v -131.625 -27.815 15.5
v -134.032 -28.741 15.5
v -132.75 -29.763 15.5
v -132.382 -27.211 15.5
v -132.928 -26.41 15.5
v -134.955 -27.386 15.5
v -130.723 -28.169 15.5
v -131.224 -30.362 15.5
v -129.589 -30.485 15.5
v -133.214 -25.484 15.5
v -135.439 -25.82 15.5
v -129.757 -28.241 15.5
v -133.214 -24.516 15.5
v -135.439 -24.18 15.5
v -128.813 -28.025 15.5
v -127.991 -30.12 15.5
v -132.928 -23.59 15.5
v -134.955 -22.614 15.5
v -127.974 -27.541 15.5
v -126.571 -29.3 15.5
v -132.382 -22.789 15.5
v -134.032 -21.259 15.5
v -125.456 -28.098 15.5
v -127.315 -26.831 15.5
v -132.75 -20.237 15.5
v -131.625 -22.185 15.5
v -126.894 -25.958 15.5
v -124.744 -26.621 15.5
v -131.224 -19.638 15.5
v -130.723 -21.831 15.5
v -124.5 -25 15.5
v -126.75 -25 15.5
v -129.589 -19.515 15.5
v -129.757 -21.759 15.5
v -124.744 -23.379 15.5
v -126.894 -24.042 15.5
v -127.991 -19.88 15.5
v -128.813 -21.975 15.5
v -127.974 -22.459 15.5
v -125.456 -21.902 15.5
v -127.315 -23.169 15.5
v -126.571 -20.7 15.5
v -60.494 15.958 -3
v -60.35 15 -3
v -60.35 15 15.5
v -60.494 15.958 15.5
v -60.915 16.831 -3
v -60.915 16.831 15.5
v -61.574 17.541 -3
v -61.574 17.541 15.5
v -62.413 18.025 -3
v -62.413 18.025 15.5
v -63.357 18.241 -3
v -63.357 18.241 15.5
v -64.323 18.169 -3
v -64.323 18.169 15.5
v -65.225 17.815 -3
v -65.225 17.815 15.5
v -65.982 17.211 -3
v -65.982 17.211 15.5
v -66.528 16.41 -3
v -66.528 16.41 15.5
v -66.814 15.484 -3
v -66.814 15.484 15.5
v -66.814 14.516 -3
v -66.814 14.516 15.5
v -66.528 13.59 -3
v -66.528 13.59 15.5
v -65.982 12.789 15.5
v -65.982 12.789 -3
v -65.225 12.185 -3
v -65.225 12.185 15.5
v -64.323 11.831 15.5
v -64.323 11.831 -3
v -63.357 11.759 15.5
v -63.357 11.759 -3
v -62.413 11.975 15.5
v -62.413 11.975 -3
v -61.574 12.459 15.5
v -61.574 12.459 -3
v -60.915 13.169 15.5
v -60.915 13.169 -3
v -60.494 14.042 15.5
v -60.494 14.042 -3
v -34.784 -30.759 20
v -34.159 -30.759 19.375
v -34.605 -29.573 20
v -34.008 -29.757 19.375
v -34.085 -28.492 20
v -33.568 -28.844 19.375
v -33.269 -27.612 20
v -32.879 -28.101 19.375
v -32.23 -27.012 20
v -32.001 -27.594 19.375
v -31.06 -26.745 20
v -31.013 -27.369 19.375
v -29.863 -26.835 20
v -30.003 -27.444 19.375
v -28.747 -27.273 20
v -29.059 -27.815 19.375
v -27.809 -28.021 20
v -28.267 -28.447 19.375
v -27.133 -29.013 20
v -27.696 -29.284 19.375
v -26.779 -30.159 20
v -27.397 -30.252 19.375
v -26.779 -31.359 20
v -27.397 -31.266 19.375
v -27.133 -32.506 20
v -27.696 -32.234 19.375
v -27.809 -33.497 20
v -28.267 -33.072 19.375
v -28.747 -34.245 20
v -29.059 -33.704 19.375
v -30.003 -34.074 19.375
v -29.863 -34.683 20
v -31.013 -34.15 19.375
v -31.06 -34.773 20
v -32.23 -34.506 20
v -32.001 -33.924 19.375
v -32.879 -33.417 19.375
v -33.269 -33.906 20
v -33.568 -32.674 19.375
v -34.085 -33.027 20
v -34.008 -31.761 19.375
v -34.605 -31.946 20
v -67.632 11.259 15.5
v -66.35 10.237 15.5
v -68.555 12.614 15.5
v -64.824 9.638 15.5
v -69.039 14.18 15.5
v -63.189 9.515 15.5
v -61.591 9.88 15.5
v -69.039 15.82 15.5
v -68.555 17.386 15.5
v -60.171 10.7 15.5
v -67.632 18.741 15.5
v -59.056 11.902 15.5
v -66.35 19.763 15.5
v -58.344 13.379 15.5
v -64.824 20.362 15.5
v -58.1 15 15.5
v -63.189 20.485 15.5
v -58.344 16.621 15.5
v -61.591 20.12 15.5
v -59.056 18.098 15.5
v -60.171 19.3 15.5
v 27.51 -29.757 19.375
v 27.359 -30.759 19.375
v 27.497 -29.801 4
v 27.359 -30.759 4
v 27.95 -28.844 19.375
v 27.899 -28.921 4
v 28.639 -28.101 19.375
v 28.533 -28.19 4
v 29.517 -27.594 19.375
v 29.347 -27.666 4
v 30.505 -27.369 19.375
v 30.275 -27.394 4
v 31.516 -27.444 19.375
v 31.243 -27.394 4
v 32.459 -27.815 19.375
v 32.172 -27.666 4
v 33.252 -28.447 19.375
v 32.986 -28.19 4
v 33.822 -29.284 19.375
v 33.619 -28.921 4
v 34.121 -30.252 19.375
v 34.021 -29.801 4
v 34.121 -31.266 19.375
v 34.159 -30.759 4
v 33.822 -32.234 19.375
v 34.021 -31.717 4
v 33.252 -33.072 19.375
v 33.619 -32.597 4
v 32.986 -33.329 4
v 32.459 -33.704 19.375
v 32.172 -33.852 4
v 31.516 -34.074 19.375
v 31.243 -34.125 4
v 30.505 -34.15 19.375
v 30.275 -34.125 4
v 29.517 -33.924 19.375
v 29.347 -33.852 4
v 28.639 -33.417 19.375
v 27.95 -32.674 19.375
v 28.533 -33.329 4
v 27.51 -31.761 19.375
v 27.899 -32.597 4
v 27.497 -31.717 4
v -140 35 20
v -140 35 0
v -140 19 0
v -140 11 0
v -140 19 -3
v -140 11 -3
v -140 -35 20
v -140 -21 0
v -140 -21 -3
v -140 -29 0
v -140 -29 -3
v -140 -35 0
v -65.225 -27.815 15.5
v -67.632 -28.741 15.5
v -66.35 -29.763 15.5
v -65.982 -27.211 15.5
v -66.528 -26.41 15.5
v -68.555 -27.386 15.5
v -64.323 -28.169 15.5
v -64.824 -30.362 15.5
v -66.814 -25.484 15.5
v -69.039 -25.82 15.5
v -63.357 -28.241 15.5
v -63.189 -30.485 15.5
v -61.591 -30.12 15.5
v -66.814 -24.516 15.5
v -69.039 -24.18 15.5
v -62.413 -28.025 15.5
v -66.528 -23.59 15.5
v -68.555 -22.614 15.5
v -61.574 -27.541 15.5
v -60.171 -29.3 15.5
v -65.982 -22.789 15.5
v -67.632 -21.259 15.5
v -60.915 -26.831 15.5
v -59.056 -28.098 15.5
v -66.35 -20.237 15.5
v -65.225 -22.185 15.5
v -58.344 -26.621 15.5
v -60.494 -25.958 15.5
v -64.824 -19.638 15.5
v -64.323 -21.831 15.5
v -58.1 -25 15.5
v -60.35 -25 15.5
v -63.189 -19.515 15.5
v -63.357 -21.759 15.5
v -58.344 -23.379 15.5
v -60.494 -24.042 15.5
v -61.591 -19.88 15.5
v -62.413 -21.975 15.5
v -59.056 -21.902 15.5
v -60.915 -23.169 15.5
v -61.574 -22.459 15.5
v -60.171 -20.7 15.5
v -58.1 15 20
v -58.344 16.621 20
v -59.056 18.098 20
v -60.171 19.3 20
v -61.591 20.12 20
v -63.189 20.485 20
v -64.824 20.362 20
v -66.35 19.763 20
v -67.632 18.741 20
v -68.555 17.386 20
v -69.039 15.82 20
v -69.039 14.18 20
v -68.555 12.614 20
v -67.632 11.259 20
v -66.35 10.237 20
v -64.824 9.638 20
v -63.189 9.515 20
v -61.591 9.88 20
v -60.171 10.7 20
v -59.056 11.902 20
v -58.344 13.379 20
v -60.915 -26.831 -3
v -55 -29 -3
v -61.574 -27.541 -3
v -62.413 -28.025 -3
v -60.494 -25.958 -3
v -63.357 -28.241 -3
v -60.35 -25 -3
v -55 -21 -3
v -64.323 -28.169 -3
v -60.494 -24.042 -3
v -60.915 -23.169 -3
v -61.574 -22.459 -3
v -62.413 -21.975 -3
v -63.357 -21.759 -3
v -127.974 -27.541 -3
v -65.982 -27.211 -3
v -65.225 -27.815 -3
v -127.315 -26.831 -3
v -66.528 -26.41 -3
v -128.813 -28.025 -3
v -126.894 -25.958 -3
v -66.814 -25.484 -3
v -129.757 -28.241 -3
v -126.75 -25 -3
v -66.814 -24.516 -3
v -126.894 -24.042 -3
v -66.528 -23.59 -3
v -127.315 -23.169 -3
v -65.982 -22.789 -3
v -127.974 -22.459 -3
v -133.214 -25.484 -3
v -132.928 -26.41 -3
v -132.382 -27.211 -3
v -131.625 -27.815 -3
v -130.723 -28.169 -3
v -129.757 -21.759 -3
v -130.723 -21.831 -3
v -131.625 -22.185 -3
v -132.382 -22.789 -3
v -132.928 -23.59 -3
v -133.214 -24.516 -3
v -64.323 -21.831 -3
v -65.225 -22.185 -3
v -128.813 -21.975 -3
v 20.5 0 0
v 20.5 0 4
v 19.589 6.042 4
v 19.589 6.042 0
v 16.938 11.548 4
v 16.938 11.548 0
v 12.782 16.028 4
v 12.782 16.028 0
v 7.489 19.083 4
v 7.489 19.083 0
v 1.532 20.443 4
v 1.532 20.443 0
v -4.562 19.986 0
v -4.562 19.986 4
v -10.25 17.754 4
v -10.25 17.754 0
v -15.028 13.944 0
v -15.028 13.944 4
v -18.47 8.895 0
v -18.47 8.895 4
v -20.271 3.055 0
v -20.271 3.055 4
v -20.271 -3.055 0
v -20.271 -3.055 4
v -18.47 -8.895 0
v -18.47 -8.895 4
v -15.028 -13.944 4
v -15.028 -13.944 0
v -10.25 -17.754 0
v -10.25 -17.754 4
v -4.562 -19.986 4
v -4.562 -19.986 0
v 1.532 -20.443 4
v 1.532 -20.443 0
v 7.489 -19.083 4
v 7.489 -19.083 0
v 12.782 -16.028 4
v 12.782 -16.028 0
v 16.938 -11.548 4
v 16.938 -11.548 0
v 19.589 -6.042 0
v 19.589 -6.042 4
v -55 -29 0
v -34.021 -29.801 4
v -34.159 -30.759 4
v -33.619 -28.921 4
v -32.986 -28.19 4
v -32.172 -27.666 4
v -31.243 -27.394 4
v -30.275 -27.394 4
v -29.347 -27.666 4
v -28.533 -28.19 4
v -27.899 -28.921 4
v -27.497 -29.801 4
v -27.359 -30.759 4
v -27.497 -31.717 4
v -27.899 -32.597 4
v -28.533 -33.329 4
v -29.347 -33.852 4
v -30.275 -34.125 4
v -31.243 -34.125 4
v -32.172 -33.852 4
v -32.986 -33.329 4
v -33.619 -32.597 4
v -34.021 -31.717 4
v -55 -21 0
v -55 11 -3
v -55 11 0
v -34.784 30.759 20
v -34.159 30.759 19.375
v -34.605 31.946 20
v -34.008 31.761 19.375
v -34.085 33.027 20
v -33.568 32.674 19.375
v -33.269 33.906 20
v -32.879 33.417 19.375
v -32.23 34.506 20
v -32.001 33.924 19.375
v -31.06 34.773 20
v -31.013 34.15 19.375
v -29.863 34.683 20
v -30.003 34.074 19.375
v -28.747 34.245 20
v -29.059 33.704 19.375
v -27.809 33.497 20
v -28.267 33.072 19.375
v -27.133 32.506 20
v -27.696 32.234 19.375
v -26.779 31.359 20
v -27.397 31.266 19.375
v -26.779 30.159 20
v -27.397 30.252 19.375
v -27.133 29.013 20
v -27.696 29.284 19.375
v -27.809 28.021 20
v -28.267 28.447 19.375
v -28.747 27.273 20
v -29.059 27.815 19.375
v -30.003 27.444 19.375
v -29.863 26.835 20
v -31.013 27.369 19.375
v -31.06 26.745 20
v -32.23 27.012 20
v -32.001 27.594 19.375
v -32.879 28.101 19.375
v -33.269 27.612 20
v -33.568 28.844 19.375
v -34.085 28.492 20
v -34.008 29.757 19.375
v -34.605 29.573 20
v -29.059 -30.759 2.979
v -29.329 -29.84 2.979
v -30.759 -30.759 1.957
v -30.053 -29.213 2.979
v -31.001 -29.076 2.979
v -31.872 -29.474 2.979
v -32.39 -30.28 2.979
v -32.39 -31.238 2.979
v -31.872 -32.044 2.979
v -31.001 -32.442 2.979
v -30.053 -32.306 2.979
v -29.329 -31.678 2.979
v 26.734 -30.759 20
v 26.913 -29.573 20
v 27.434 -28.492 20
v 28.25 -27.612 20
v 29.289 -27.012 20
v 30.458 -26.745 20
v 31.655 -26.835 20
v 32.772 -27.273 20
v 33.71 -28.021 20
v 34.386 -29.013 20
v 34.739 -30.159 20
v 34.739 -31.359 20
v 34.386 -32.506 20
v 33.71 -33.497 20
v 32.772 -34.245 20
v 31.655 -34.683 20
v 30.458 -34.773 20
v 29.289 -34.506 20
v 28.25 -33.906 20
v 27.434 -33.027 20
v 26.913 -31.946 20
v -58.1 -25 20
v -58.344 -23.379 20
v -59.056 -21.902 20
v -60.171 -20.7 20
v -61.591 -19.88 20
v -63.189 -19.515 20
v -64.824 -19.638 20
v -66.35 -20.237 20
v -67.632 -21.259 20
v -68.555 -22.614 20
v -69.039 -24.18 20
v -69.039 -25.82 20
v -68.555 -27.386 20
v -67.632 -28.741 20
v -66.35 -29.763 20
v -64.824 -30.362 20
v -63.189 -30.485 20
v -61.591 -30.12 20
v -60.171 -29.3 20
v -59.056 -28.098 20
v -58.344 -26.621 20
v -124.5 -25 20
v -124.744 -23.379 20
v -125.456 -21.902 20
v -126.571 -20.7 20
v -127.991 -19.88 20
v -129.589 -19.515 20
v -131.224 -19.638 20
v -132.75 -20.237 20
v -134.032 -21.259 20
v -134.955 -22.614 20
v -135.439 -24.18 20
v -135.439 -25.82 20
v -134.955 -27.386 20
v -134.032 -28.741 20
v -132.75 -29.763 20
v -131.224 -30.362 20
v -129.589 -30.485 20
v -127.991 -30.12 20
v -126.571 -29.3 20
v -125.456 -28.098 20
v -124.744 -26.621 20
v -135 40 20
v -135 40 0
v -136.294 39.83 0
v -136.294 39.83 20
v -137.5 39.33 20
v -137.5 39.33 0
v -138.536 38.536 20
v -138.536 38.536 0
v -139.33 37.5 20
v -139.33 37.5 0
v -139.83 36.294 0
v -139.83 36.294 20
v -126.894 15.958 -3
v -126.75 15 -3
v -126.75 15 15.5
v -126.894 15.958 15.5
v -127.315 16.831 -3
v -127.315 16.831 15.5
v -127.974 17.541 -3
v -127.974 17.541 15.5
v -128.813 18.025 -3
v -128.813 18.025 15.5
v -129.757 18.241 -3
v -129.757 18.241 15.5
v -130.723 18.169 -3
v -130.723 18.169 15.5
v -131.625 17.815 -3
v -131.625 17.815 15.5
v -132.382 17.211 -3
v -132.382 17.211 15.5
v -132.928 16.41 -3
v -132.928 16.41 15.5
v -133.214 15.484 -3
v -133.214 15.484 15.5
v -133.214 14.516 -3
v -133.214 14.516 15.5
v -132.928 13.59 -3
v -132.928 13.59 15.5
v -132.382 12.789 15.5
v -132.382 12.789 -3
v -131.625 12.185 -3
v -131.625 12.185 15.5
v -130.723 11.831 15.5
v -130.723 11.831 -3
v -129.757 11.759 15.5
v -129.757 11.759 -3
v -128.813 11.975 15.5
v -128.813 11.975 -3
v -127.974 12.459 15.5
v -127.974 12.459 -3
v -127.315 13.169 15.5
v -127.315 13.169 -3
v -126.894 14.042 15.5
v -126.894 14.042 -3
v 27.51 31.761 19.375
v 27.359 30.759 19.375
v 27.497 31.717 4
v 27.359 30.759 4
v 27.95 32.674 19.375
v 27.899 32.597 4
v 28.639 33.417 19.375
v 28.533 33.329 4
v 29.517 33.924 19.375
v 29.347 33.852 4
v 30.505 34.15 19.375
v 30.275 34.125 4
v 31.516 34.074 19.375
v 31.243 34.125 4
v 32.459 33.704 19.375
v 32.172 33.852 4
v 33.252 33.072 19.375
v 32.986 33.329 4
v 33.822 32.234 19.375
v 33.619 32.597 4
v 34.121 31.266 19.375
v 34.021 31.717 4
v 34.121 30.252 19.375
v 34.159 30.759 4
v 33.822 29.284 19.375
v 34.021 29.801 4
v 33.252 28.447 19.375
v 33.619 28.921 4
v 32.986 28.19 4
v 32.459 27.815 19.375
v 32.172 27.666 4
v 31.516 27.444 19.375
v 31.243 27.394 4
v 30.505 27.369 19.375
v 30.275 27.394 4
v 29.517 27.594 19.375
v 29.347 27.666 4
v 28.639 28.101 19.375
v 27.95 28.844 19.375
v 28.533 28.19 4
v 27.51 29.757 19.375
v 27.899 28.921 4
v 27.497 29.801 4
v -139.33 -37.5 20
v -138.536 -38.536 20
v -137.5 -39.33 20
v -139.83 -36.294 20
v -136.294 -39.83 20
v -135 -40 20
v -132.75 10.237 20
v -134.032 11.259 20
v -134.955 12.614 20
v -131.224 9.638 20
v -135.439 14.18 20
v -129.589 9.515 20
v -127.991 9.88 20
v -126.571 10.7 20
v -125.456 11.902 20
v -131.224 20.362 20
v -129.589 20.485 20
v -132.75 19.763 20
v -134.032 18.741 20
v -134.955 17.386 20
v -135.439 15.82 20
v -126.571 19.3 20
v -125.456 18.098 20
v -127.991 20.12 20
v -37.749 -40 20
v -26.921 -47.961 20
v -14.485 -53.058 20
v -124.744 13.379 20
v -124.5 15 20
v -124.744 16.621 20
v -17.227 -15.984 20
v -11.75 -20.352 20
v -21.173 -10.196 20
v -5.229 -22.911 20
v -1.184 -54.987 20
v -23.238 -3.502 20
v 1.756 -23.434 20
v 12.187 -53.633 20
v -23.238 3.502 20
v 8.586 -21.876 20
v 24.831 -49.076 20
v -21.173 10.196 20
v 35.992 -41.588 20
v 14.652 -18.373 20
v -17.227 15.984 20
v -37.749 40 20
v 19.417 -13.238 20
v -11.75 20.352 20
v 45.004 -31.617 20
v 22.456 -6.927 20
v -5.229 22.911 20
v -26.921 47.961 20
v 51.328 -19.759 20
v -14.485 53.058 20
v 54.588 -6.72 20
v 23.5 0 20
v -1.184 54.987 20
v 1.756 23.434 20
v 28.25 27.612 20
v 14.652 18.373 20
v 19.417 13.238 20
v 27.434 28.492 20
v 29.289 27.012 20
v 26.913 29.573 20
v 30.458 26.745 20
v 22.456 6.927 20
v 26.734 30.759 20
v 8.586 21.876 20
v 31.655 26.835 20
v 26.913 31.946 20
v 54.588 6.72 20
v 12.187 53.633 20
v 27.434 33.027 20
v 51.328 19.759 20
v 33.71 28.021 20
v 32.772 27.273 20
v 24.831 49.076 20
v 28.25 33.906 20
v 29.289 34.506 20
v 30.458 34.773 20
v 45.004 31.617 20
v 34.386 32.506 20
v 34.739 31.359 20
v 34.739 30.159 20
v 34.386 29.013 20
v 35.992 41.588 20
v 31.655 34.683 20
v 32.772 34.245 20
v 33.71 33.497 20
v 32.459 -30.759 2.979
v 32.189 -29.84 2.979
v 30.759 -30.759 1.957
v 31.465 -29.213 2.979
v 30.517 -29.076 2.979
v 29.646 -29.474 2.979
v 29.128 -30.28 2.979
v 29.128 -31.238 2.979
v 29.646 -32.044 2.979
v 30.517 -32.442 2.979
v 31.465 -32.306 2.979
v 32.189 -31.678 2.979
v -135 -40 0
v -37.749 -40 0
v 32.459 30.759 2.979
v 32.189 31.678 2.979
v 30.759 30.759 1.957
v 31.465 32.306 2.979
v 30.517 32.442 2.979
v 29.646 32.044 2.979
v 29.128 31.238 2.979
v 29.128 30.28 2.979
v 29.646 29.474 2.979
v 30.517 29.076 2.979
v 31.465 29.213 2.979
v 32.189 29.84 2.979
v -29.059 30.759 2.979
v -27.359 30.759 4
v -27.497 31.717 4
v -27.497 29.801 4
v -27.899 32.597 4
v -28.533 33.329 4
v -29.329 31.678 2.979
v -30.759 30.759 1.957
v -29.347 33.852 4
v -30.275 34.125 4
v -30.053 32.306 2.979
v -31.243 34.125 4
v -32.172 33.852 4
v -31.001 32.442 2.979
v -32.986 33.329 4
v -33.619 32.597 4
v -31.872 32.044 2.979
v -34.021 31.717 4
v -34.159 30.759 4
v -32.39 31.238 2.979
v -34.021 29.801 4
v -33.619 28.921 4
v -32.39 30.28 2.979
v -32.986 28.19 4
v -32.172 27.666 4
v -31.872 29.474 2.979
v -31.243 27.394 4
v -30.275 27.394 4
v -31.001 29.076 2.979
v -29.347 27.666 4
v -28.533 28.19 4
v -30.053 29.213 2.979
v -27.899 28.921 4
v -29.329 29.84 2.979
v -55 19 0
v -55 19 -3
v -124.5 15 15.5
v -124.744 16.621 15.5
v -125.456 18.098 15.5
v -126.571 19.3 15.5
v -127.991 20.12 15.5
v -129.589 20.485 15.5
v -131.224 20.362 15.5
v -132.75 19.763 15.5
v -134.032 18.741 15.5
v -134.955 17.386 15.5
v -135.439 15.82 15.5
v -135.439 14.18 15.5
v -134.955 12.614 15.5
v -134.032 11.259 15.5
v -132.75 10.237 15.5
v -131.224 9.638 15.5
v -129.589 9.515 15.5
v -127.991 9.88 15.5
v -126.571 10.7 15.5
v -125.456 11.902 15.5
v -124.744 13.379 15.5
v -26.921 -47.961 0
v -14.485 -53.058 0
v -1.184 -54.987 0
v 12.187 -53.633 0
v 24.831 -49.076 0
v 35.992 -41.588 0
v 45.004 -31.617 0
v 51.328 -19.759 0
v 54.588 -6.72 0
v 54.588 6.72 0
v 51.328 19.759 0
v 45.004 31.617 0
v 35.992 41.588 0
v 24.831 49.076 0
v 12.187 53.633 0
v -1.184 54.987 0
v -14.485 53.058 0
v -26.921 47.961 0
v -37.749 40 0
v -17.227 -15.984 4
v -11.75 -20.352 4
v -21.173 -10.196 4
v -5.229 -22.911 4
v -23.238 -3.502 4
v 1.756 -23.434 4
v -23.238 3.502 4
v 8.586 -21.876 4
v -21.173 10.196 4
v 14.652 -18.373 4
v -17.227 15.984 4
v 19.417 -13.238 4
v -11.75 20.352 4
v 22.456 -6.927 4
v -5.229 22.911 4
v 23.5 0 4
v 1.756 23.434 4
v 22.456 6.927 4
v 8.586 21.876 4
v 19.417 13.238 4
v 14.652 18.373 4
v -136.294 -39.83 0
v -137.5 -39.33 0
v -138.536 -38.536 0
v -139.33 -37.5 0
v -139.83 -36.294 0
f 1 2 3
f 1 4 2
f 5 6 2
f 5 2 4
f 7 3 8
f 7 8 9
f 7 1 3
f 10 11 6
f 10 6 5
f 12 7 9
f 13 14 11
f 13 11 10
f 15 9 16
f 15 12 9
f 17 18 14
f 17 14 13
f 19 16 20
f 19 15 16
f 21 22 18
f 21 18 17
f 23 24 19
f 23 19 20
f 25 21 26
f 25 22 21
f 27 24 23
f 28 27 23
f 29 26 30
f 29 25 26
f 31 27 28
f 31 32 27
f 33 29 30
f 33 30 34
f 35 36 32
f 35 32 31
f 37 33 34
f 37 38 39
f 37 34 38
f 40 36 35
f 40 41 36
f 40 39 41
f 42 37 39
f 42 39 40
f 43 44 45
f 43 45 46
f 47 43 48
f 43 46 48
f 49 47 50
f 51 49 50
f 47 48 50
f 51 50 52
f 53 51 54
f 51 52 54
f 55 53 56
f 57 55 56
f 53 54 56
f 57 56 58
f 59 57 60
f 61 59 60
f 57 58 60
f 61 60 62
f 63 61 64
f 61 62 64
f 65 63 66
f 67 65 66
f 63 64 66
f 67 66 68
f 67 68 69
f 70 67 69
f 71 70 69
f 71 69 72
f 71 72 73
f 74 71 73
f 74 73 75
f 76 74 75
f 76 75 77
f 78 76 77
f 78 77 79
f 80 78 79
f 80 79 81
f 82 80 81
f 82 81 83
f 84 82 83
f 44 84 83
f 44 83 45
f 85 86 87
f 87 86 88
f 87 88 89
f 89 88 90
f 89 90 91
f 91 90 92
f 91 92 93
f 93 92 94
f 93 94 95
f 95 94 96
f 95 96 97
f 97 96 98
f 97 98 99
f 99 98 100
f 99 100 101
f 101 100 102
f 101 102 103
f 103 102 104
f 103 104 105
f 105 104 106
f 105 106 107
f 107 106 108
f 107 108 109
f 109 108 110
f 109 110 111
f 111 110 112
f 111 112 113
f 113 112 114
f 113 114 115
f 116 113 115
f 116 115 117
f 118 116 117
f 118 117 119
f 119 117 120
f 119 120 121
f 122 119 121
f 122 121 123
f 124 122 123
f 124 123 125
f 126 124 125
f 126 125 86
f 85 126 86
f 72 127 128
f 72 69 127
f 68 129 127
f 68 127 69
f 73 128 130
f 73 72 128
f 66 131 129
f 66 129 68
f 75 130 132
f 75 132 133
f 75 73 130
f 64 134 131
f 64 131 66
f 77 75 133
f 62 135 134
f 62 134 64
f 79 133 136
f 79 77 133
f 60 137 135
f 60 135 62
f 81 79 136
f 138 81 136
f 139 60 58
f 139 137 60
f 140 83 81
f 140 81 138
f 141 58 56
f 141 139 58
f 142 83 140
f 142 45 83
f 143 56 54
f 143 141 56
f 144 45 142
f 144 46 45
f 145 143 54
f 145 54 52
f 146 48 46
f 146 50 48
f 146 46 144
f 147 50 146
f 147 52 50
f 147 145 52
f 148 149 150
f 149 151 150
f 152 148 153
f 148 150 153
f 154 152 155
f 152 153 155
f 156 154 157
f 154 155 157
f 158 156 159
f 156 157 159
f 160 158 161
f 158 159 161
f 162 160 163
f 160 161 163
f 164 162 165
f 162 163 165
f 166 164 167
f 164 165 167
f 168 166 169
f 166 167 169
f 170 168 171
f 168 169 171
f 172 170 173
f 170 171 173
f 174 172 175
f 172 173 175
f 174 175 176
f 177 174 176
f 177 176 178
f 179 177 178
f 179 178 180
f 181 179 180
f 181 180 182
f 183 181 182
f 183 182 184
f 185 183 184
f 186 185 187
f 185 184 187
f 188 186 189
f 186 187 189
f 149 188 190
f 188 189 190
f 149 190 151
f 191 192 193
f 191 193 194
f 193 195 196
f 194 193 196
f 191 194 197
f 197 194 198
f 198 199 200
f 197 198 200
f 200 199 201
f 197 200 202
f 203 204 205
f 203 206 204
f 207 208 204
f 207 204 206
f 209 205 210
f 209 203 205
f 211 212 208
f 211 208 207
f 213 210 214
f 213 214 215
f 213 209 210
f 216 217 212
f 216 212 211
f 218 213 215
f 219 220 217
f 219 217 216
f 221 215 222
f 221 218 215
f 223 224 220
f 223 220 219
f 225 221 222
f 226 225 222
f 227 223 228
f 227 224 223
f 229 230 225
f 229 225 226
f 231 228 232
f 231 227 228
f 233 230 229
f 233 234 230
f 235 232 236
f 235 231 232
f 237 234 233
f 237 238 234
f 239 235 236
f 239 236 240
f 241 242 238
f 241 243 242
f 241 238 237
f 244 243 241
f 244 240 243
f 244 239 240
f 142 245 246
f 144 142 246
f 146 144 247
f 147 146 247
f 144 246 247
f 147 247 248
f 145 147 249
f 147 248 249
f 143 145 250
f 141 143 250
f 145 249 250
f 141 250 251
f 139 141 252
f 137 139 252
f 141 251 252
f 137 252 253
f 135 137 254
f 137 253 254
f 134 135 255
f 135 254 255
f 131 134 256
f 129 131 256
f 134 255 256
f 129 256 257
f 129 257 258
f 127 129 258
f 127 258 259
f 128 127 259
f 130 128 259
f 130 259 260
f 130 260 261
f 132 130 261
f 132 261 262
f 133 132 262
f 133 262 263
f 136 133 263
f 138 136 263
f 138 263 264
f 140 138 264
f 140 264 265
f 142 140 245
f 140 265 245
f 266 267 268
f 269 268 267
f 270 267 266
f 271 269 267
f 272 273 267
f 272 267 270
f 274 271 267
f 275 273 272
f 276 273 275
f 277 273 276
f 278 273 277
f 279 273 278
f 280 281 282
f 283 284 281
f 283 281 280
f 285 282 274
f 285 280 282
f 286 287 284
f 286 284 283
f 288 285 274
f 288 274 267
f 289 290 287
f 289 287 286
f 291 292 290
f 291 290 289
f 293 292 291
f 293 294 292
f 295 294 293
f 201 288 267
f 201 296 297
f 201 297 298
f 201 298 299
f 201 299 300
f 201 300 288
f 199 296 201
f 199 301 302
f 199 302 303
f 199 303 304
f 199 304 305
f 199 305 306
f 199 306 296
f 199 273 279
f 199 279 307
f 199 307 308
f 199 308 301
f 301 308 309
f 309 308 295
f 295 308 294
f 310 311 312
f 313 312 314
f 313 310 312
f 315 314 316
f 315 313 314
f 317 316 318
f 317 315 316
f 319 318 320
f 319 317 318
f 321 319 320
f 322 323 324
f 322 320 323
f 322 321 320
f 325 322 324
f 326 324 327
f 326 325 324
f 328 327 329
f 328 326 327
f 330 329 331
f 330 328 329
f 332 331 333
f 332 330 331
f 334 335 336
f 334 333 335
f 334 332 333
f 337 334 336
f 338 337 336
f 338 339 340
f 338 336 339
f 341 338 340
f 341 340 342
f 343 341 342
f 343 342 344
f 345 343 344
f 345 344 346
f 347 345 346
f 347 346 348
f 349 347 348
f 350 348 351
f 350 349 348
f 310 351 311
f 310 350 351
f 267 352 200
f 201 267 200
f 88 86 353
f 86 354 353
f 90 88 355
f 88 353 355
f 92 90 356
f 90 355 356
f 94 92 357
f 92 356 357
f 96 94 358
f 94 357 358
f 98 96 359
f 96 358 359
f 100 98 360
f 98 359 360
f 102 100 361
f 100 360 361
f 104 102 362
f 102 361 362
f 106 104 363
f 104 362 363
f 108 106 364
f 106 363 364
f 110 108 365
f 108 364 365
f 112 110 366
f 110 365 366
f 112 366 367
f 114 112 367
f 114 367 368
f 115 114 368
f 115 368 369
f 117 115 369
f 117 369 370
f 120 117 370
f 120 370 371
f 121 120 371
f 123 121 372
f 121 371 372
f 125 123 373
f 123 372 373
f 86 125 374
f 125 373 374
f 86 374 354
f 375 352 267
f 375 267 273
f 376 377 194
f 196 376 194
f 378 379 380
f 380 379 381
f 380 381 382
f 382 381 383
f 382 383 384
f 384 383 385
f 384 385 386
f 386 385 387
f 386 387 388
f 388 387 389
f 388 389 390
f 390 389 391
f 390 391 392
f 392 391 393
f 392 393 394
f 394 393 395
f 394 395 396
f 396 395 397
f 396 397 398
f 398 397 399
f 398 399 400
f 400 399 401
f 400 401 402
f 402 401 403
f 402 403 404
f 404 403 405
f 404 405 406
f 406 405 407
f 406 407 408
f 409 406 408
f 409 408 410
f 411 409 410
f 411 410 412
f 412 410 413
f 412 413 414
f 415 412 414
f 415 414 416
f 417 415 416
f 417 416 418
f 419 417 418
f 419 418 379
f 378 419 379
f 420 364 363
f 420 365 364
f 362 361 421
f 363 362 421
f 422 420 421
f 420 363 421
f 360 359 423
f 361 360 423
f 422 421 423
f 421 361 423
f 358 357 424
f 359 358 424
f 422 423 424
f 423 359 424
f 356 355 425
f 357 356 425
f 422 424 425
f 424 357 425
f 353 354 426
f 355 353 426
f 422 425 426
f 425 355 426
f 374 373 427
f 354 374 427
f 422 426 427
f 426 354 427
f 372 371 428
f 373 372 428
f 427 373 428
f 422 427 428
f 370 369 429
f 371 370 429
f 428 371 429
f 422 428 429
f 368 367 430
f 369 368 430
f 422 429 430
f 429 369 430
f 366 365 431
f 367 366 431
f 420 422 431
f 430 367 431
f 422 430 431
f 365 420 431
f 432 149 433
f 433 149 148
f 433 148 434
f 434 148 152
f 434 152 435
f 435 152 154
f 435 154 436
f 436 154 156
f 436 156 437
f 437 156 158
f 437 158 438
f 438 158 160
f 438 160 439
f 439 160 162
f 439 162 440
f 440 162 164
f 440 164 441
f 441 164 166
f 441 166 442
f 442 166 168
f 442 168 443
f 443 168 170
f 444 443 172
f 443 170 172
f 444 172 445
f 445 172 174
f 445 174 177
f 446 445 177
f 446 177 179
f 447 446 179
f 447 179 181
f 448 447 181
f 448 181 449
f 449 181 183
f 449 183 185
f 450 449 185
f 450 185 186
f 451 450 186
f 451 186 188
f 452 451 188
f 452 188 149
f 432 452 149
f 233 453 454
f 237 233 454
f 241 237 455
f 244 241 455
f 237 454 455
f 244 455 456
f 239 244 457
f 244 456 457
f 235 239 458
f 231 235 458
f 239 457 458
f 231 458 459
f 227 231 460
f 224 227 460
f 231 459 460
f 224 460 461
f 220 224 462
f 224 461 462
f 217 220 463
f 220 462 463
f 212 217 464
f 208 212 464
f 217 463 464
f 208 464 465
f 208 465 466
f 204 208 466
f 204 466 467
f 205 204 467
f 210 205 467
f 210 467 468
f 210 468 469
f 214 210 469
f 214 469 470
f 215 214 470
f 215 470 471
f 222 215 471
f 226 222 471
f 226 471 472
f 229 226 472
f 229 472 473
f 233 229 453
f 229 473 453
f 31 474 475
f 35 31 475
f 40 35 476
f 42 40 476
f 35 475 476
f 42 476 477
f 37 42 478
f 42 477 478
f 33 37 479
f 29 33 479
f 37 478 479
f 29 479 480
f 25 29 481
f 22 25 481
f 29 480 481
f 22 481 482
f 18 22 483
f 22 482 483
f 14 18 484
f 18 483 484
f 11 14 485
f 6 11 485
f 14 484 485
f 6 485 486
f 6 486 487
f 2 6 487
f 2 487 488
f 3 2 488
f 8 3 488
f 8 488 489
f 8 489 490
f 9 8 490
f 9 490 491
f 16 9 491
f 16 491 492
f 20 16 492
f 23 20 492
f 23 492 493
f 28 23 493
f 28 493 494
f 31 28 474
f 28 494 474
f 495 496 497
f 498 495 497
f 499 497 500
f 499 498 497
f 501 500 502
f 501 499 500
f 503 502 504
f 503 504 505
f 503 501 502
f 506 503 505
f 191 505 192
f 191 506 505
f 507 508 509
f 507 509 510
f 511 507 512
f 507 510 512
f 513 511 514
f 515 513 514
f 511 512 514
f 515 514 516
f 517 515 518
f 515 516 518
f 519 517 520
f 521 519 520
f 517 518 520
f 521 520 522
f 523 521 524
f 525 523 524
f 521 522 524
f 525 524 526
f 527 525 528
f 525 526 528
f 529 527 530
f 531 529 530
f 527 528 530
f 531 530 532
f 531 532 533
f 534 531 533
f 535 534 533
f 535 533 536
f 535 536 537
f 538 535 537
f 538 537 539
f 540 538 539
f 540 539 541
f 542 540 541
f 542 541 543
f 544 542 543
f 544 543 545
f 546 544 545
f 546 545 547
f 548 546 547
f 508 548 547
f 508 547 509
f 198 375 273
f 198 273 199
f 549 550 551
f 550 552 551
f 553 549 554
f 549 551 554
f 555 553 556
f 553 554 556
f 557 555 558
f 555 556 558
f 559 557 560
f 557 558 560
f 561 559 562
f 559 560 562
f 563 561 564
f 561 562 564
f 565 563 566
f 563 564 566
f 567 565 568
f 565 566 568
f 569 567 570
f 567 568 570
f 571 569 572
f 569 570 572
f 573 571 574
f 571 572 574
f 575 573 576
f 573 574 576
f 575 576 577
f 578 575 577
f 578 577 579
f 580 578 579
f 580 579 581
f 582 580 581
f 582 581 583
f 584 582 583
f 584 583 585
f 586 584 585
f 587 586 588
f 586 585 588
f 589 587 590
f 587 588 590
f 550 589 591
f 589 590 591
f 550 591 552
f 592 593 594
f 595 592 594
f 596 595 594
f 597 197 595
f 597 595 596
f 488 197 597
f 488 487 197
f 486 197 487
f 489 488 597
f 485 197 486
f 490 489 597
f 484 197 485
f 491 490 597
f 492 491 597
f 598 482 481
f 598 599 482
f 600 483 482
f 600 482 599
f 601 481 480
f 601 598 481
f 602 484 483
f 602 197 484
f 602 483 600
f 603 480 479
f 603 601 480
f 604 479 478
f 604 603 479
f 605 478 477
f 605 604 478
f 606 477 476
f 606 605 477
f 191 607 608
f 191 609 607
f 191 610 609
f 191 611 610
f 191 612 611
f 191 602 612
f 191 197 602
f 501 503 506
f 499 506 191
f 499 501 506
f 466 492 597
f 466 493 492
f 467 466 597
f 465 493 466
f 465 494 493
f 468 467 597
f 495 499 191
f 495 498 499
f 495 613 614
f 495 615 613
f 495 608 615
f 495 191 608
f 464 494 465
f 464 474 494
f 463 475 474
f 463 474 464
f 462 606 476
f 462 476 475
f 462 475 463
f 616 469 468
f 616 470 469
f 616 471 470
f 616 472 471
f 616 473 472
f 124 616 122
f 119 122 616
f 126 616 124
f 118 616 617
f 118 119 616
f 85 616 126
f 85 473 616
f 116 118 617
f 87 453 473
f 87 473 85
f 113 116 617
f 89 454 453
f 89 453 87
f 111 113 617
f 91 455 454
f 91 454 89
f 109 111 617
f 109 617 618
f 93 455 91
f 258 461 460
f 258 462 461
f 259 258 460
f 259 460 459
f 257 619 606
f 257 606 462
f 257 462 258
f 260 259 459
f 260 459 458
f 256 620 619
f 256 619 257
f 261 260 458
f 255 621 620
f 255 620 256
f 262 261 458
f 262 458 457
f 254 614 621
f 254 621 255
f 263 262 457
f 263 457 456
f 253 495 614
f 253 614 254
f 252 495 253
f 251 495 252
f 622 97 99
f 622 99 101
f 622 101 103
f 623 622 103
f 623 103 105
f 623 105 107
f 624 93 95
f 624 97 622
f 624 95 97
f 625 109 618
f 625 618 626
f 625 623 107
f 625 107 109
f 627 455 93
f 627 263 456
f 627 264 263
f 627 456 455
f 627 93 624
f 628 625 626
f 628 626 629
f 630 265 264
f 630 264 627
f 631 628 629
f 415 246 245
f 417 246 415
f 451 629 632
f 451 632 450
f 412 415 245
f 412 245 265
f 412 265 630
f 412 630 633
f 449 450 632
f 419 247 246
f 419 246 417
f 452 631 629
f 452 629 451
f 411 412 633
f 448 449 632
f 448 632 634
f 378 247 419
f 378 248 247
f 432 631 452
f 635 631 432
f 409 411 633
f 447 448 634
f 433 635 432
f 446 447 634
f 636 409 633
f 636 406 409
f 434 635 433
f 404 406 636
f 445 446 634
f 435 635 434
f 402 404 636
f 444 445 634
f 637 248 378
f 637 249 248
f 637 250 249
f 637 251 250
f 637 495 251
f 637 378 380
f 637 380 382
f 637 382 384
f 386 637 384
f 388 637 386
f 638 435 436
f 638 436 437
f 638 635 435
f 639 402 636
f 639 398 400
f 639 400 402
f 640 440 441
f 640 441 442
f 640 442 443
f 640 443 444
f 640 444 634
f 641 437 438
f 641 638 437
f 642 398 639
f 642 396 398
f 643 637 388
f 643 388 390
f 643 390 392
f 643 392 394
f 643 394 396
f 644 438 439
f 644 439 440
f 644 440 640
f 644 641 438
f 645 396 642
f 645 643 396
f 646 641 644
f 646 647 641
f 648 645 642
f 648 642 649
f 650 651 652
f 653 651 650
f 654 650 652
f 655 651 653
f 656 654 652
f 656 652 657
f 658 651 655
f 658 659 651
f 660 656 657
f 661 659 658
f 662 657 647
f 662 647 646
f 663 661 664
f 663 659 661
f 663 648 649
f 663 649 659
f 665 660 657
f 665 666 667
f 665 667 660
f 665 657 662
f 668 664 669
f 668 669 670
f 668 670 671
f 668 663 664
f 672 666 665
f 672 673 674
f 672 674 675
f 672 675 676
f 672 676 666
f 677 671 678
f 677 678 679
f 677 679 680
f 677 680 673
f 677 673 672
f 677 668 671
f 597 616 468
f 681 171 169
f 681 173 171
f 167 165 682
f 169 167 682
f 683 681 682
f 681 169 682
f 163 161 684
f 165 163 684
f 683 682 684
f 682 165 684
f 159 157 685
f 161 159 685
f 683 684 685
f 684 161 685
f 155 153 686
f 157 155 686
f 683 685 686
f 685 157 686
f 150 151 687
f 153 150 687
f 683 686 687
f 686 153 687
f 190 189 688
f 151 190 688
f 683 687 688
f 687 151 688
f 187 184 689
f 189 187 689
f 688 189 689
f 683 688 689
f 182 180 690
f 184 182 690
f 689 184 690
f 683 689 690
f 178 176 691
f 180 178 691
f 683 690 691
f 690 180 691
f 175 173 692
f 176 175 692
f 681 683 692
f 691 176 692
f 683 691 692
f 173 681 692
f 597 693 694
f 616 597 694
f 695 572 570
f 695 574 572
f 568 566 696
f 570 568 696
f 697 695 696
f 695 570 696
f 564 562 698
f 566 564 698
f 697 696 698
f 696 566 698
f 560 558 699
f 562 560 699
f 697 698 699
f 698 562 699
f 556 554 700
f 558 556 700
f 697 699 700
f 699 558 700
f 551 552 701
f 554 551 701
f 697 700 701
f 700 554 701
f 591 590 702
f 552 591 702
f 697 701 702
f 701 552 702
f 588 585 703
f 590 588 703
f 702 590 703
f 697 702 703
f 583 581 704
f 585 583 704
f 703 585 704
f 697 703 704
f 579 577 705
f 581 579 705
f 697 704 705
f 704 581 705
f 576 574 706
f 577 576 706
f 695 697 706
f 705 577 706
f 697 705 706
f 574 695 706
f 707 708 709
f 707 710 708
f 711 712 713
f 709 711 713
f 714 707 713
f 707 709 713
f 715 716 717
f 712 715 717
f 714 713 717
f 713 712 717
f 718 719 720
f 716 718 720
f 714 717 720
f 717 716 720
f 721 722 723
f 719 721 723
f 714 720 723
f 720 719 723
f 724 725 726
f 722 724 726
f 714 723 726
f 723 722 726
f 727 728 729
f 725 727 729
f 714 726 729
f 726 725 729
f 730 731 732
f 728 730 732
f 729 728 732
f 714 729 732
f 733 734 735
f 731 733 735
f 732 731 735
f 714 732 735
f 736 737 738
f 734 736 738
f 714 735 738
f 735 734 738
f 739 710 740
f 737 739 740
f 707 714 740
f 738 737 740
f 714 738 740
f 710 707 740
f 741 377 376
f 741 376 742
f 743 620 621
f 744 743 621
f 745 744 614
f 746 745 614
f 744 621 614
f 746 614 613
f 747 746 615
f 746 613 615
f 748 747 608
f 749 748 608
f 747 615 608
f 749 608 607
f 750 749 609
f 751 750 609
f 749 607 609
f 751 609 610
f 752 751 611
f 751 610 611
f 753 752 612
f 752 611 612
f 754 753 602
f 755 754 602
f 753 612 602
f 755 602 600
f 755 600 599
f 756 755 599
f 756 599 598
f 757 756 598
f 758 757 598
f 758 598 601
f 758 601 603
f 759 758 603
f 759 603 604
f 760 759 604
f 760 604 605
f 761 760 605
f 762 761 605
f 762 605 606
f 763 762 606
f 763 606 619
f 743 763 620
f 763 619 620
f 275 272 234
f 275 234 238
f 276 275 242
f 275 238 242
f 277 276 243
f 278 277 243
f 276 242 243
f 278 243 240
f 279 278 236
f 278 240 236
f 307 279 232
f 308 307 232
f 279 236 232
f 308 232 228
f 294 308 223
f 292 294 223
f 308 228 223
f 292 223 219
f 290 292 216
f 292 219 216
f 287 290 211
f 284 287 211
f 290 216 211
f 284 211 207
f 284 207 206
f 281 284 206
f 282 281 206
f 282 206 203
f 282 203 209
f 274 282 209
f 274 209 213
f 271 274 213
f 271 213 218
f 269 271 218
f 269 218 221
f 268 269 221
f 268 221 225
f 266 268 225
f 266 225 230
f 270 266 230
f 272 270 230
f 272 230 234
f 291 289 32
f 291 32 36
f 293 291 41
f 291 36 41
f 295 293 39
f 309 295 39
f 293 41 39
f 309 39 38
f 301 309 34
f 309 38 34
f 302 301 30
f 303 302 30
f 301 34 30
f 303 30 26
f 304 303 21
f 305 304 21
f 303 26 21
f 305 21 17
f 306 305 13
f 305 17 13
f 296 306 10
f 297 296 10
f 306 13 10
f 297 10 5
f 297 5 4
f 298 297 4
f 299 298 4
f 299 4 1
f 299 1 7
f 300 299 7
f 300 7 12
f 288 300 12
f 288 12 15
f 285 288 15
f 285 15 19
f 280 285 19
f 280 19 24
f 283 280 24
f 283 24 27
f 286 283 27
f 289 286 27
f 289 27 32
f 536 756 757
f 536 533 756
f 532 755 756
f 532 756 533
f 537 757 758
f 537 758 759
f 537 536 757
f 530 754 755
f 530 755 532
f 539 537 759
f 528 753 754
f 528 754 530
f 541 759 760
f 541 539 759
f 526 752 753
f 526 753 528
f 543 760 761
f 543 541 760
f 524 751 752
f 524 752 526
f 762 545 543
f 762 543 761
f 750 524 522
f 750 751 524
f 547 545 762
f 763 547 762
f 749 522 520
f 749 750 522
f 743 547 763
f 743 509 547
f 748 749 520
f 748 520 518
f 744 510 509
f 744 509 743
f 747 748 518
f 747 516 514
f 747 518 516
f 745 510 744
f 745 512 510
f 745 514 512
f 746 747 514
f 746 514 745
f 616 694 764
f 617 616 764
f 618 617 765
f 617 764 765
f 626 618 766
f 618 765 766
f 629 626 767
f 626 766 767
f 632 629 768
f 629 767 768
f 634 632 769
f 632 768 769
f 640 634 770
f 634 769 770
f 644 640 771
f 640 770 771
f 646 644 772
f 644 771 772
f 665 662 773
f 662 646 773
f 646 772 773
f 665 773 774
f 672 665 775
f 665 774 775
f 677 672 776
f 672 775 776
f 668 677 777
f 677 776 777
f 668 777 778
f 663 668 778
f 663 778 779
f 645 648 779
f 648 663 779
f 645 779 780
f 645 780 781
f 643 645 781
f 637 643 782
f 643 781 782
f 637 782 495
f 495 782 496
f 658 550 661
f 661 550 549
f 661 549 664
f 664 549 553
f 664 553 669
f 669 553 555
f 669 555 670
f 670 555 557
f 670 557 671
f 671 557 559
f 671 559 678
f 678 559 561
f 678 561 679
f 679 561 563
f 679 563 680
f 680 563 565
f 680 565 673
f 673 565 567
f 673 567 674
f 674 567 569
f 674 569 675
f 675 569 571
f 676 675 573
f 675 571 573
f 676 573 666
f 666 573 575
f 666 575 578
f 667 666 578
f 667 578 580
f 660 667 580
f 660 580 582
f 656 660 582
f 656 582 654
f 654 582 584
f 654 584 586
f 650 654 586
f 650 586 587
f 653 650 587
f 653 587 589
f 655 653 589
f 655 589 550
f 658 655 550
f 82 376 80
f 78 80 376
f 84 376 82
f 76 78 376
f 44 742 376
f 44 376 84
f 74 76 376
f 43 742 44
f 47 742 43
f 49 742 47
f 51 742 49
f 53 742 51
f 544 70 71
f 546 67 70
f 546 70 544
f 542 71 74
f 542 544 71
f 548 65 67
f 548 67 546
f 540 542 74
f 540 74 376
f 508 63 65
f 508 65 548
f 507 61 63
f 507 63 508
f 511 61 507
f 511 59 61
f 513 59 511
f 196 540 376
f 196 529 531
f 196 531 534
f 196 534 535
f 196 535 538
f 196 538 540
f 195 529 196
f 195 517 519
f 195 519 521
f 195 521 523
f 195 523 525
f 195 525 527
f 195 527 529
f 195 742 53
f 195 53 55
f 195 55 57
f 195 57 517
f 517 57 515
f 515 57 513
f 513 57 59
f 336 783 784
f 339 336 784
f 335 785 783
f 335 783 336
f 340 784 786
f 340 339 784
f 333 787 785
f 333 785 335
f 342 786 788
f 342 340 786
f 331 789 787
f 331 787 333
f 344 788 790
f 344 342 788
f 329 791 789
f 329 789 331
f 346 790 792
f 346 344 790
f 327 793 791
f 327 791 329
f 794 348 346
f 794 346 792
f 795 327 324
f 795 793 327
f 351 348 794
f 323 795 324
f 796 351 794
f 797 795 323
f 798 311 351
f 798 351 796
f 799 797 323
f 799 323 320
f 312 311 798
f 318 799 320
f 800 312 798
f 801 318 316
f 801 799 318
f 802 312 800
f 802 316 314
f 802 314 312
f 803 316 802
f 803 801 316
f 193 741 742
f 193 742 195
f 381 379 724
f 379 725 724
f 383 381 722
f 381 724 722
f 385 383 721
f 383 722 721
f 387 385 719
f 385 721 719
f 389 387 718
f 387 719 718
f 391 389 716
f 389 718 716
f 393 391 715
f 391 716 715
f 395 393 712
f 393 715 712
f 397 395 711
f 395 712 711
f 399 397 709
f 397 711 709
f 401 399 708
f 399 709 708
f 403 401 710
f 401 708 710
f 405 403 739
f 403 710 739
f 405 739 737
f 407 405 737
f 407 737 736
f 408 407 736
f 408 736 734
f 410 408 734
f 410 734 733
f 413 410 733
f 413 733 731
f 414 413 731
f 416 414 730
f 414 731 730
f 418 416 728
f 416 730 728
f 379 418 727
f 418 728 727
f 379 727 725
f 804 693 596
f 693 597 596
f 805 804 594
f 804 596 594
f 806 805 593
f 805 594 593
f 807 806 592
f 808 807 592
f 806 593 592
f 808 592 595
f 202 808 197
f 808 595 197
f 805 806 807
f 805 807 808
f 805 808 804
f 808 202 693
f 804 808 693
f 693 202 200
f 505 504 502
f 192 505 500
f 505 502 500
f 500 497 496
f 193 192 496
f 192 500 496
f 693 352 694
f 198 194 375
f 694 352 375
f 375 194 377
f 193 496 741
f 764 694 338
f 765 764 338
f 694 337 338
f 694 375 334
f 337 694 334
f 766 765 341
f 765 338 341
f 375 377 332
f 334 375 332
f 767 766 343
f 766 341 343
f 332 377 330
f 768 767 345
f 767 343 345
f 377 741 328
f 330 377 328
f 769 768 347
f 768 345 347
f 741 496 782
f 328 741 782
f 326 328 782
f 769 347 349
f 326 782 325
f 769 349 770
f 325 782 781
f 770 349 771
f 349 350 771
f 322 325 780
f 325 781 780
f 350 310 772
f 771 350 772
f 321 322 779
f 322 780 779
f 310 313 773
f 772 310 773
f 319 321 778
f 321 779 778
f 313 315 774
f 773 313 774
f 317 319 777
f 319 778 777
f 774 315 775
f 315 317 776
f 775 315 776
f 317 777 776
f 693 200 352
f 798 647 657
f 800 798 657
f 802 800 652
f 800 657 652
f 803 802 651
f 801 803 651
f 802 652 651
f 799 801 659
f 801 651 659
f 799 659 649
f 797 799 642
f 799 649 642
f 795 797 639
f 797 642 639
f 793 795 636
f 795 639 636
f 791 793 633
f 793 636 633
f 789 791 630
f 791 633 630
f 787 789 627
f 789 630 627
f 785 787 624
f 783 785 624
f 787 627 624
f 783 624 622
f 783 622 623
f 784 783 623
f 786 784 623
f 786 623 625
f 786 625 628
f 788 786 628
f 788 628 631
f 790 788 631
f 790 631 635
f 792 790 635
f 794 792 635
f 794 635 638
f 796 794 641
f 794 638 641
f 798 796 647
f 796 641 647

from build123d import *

# Parameters (mm, degrees)
SKETCH1_R                   = 20.5
BOSS_EXTRUDE1_DEPTH         = 20
BOSS_EXTRUDE3_START         = -20
SKETCH6_R                   = 55
SKETCH6_R_2                 = 20.5
BOSS_EXTRUDE3_DEPTH         = 20
SKETCH2_R                   = 23.5
CUT_EXTRUDE1_DEPTH          = 16
SKETCH4_W                   = 85
SKETCH4_H                   = 8
BOSS_EXTRUDE2_DEPTH         = 3
SKETCH3_R                   = 3.25
CUT_EXTRUDE2_DEPTH          = 153.164384795
SKETCH5_R                   = 5.5
CUT_EXTRUDE3_DEPTH          = 4.5
FILLET1_R                   = 5
M8_TAPPED_HOLE1_D           = 6.8
M8_TAPPED_HOLE1_DEPTH       = 16
M8_TAPPED_HOLE1_CSINK_D     = 8.05
M8_TAPPED_HOLE1_CSINK_ANGLE = 90
M8_TAPPED_HOLE1_TIP         = 2.042926105


with BuildPart() as part:
    # Sketch1 → Boss-Extrude1 (new body)
    with BuildSketch(Plane.XY):
        with BuildLine():
            Line((0, 40), (-140, 40))
            Line((-140, 40), (-140, -40))
            Line((-140, -40), (0, -40))
            ThreePointArc((0, -40), (40, 0), (0, 40))
        make_face()
        Circle(SKETCH1_R, mode=Mode.SUBTRACT)
    extrude(amount=BOSS_EXTRUDE1_DEPTH)

    # Sketch6 → Boss-Extrude3 (add)
    with BuildSketch(Plane.XY.offset(20).offset(BOSS_EXTRUDE3_START)):
        Circle(SKETCH6_R)
        Circle(SKETCH6_R_2, mode=Mode.SUBTRACT)
    extrude(amount=BOSS_EXTRUDE3_DEPTH)

    # Sketch2 → Cut-Extrude1 (cut)
    with BuildSketch(Plane.XY.offset(20)):
        Circle(SKETCH2_R)
    extrude(amount=-CUT_EXTRUDE1_DEPTH, mode=Mode.SUBTRACT)

    # Sketch4 → Boss-Extrude2 (add)
    with BuildSketch(Plane(origin=(0, 0, 0), x_dir=(-1, 0, 0), z_dir=(0, 0, -1))):
        with Locations((97.5, -25)):
            Rectangle(SKETCH4_W, SKETCH4_H)
        with Locations((97.5, 15)):
            Rectangle(SKETCH4_W, SKETCH4_H)
    extrude(amount=BOSS_EXTRUDE2_DEPTH)

    # Sketch3 → Cut-Extrude2 (cut, through all)
    with BuildSketch(Plane.XY.offset(20)):
        with Locations((-63.6, 15)):
            Circle(SKETCH3_R)
        with Locations((-130, 15)):
            Circle(SKETCH3_R)
        with Locations((-130, -25)):
            Circle(SKETCH3_R)
        with Locations((-63.6, -25)):
            Circle(SKETCH3_R)
    extrude(amount=-CUT_EXTRUDE2_DEPTH, mode=Mode.SUBTRACT)

    # Sketch5 → Cut-Extrude3 (cut)
    with BuildSketch(Plane.XY.offset(20)):
        with Locations((-130, 15)):
            Circle(SKETCH5_R)
        with Locations((-63.6, 15)):
            Circle(SKETCH5_R)
        with Locations((-63.6, -25)):
            Circle(SKETCH5_R)
        with Locations((-130, -25)):
            Circle(SKETCH5_R)
    extrude(amount=-CUT_EXTRUDE3_DEPTH, mode=Mode.SUBTRACT)

    # Fillet1
    fillet1_edges = [part.edges().sort_by_distance(p)[0] for p in [
        (-140, -40, 10),
        (-140, 40, 10),
    ]]
    fillet(fillet1_edges, radius=FILLET1_R)

    # M8 Tapped Hole1
    with Locations(Plane.XY.offset(20)):
        with Locations((30.759144982, 30.759144982), (-30.759144982, 30.759144982), (-30.759144982, -30.759144982), (30.759144982, -30.759144982)):
            CounterSinkHole(M8_TAPPED_HOLE1_D / 2, M8_TAPPED_HOLE1_CSINK_D / 2, depth=M8_TAPPED_HOLE1_DEPTH, counter_sink_angle=M8_TAPPED_HOLE1_CSINK_ANGLE)
            with Locations((0, 0, -(M8_TAPPED_HOLE1_DEPTH + M8_TAPPED_HOLE1_TIP / 2))):  # 118° drill point
                Cone(0, M8_TAPPED_HOLE1_D / 2, M8_TAPPED_HOLE1_TIP, mode=Mode.SUBTRACT)


solid = part.part
